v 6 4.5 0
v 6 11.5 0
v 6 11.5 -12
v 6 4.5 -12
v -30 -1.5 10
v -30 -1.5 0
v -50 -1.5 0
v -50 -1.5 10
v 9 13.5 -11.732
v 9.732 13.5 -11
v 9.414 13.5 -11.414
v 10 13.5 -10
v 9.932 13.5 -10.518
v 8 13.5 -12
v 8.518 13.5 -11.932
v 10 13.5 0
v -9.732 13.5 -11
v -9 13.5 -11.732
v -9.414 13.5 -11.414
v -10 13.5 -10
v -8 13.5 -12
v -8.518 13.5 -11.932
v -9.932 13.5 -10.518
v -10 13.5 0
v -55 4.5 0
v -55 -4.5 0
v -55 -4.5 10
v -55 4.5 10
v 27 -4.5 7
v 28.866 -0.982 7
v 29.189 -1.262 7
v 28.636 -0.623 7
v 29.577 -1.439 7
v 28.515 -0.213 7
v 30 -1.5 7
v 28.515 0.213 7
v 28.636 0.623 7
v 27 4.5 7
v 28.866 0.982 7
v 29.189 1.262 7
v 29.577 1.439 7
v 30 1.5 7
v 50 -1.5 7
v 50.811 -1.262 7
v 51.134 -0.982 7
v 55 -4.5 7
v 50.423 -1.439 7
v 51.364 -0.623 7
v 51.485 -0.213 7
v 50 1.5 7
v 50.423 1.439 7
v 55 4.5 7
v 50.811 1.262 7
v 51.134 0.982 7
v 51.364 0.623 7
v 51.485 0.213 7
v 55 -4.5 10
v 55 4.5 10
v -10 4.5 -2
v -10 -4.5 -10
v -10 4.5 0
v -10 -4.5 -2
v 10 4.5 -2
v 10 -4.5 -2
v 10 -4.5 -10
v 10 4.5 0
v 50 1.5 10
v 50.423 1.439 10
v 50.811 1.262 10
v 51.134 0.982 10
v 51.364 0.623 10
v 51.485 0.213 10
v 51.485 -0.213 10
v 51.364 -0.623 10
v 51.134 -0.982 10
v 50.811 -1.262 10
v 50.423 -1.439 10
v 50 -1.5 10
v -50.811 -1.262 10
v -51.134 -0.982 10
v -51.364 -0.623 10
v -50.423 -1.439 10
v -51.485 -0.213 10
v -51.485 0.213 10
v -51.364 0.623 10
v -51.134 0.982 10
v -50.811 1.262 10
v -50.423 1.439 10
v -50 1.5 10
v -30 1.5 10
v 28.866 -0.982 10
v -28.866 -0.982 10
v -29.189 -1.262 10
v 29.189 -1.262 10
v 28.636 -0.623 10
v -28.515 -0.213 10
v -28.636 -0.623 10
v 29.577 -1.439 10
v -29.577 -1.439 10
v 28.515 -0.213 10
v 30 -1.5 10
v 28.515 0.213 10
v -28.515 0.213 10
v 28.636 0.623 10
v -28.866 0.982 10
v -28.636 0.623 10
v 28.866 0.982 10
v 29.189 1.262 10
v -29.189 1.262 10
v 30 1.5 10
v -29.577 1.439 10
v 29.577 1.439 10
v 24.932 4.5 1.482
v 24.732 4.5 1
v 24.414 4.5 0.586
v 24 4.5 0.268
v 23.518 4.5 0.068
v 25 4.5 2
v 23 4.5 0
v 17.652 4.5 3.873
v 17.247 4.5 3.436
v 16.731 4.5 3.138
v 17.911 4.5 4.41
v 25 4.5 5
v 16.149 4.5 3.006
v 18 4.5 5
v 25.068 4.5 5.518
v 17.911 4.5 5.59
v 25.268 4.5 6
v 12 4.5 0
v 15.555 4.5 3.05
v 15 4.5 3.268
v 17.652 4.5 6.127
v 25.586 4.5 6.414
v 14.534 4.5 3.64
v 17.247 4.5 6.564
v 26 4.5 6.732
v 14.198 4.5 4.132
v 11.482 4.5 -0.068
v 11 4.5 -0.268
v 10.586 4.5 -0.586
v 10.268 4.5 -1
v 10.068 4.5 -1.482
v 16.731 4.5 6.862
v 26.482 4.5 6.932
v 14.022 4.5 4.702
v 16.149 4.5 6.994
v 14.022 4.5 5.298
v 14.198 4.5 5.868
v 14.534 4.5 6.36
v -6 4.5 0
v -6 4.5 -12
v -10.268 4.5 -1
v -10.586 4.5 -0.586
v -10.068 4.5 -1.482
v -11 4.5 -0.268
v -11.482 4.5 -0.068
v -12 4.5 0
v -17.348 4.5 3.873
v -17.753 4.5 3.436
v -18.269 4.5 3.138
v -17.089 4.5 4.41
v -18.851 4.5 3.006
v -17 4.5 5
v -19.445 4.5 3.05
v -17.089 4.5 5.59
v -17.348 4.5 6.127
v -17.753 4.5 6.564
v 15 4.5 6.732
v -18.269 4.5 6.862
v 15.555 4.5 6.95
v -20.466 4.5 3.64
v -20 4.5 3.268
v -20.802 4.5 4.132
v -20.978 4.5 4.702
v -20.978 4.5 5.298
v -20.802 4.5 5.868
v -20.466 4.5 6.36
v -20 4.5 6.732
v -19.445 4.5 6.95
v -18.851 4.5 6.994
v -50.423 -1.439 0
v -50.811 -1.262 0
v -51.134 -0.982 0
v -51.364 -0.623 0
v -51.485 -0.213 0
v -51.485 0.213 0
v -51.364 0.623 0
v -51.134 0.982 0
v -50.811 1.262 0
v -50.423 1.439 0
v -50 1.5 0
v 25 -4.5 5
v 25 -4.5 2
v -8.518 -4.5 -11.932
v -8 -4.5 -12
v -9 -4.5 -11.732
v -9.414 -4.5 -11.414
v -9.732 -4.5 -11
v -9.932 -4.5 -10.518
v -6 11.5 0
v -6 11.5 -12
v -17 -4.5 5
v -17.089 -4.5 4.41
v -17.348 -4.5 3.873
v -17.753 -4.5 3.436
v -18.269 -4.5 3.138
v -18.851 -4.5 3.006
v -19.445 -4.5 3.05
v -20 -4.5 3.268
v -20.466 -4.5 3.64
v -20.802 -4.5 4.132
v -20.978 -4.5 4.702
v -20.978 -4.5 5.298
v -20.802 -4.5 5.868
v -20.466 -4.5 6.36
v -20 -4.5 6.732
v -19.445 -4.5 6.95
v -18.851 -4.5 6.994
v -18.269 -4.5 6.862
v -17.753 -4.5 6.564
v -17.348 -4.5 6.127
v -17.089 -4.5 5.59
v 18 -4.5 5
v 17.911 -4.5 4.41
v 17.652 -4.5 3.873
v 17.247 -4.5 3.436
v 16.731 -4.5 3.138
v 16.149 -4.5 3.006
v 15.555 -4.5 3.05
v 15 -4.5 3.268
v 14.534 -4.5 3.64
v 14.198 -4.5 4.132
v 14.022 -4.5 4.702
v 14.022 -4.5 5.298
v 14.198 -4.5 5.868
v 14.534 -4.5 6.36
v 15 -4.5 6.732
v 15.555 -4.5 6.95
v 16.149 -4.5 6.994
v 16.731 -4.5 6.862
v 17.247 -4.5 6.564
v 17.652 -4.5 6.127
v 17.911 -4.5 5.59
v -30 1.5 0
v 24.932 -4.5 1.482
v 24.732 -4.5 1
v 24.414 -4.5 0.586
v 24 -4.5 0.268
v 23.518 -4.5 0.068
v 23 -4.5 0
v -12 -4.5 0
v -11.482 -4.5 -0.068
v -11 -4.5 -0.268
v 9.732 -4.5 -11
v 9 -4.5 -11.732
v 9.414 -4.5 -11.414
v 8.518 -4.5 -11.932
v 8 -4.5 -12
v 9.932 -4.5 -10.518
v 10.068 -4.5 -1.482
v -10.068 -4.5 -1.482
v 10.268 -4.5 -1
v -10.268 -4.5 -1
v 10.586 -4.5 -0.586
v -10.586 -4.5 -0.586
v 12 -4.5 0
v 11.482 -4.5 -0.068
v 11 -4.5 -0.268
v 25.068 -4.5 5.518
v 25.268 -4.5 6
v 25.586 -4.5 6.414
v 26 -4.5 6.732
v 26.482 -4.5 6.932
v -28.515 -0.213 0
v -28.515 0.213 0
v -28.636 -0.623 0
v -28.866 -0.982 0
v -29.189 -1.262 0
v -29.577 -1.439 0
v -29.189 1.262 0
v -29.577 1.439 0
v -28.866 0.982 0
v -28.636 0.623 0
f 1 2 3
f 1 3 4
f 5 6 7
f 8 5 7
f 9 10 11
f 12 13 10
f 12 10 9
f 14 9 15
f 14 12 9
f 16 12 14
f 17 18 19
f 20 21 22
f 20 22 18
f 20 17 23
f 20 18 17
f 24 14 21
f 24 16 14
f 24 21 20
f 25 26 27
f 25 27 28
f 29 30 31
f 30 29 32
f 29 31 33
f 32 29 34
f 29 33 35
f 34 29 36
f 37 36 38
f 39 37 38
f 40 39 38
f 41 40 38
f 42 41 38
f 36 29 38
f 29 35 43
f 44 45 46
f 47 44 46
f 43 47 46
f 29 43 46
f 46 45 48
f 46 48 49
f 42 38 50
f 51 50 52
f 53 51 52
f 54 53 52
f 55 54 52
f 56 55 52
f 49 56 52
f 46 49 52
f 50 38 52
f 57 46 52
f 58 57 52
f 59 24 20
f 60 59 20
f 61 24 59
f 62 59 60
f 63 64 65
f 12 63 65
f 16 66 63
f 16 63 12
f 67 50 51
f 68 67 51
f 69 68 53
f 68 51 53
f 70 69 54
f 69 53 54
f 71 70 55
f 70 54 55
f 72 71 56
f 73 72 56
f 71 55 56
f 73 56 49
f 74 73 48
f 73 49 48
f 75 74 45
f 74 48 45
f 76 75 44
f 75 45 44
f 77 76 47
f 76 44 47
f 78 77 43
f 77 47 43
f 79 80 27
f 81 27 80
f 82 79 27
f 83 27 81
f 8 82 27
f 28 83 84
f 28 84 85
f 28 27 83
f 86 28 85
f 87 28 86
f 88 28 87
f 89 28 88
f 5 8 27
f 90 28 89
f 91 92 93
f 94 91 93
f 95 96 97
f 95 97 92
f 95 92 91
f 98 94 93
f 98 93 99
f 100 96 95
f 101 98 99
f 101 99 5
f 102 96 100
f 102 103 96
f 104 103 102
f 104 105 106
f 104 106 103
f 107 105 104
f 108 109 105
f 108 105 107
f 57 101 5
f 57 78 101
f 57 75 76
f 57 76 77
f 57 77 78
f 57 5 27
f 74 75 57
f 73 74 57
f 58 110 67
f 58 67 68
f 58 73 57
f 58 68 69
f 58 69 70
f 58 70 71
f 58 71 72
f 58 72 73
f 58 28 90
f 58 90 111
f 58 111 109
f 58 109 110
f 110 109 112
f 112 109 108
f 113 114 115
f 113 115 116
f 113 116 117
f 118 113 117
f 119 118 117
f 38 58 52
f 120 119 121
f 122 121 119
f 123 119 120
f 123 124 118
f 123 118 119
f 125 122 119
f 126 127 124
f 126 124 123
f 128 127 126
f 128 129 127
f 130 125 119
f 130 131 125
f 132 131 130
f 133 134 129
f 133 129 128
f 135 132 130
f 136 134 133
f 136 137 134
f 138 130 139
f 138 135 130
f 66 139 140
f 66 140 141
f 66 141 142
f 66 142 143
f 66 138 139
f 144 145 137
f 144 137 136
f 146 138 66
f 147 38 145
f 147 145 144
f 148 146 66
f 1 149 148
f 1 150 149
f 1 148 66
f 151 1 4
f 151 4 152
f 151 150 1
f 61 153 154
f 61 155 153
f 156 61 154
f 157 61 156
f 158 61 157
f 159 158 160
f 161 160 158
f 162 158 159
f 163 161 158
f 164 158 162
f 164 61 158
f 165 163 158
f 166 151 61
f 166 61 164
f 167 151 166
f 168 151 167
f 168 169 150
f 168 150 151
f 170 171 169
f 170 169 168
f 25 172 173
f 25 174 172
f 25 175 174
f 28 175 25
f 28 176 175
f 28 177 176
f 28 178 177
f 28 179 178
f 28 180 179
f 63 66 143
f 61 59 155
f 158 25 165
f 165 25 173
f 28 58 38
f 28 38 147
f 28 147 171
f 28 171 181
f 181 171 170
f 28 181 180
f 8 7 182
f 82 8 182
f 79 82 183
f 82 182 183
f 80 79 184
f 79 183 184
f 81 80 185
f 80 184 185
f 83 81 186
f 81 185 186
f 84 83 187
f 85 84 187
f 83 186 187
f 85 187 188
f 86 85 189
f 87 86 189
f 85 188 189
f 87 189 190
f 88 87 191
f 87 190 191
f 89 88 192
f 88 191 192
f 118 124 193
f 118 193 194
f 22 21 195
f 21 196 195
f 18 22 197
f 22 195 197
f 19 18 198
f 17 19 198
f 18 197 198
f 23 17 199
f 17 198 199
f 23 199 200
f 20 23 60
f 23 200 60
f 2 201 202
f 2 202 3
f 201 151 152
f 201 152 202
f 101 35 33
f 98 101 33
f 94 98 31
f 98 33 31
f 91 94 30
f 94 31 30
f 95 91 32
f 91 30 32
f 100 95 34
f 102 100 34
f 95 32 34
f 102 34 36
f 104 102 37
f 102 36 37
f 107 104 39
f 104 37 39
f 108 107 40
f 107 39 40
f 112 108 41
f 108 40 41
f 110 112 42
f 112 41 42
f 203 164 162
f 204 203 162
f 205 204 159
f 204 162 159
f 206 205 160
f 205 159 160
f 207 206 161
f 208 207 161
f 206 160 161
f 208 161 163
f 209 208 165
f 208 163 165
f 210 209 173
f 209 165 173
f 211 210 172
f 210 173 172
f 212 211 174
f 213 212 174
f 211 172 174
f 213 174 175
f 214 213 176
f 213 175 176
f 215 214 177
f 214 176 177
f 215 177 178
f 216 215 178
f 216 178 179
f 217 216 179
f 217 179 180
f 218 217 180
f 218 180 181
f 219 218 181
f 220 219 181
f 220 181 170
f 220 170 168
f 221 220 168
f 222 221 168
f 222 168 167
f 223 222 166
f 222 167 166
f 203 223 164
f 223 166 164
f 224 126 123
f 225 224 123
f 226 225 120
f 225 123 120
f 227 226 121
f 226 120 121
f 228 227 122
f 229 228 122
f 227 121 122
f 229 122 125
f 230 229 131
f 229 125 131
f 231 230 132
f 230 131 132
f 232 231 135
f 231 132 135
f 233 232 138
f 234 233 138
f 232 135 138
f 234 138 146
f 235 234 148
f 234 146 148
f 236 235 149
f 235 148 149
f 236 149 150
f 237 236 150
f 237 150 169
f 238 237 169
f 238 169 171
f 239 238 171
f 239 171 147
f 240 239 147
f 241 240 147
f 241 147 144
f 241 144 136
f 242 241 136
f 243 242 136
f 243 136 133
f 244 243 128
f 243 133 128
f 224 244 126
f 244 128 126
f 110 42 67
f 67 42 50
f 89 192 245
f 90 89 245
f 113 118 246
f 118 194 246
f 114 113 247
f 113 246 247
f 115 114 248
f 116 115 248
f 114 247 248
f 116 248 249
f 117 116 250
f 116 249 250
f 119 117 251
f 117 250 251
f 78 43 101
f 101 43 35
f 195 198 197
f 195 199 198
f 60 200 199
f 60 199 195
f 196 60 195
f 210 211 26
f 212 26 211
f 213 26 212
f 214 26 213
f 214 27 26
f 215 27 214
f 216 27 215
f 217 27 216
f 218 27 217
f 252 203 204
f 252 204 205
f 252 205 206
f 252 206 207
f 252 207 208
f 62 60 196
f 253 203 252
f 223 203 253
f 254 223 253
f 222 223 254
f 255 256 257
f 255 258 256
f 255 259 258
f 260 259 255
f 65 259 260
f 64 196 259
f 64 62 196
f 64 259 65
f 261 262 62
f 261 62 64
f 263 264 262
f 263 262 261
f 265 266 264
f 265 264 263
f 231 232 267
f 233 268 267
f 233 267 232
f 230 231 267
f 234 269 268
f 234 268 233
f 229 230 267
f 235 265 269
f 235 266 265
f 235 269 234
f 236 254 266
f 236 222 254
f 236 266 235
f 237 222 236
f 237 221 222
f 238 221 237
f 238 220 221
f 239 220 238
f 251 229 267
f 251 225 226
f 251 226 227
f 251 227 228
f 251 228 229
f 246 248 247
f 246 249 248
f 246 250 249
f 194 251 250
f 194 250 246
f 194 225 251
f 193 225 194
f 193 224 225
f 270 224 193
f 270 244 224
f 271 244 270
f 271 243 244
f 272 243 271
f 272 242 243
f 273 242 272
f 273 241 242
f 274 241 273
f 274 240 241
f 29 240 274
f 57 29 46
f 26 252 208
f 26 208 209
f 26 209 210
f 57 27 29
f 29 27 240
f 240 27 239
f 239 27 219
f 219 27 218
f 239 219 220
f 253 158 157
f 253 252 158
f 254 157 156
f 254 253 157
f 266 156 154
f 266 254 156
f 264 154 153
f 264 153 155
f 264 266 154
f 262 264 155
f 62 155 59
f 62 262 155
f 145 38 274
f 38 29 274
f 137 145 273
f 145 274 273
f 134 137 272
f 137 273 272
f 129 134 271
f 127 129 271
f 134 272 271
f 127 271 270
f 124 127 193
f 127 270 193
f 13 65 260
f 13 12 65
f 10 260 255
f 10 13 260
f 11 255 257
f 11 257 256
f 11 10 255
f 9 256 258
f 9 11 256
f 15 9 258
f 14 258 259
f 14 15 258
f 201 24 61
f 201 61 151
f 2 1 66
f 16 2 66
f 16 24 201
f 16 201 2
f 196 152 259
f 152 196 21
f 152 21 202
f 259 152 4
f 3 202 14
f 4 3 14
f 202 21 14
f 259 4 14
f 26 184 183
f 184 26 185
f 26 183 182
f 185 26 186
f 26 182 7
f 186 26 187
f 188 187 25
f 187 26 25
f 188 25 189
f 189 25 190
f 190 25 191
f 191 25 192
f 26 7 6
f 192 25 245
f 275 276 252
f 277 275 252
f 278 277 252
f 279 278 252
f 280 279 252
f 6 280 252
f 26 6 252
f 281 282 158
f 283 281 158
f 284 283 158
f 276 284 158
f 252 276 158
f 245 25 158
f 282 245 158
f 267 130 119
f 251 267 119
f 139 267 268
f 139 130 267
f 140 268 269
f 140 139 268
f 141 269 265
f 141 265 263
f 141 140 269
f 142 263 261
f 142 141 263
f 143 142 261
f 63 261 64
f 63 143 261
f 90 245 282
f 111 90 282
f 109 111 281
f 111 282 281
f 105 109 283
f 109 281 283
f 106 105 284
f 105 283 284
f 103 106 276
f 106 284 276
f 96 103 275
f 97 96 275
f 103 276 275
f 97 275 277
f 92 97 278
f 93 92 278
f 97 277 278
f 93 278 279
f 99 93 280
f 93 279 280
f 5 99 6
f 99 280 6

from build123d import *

# Parameters (mm, degrees)
ESBO_O1_W                = 45
ESBO_O1_H                = 9
RESSALTO_EXTRUS_O2_DEPTH = 10
RESSALTO_EXTRUS_O3_DEPTH = 12
ESBO_O2_R                = 2
ESBO_O2_W                = 30
ESBO_O2_H                = 7
CORTE_EXTRUS_O4_DEPTH    = 9
FILETE2_R                = 2


with BuildPart() as part:
    # Esboço1 → Ressalto-extrusão2 (new body)
    with BuildSketch(Plane.XY):
        with Locations((32.5, 0)):
            Rectangle(ESBO_O1_W, ESBO_O1_H)
        with BuildLine():
            ThreePointArc((30, -1.5), (28.5, 0), (30, 1.5))
            Line((30, 1.5), (50, 1.5))
            ThreePointArc((50, 1.5), (51.5, 0), (50, -1.5))
            Line((50, -1.5), (30, -1.5))
        make_face(mode=Mode.SUBTRACT)
        Polygon((6, 4.5), (-6, 4.5), (-10, 4.5), (-10, -4.5), (10, -4.5), (10, 4.5), align=None)
        with Locations((-32.5, 0)):
            Rectangle(ESBO_O1_W, ESBO_O1_H)
        with BuildLine():
            ThreePointArc((-50, -1.5), (-51.5, 0), (-50, 1.5))
            Line((-50, 1.5), (-30, 1.5))
            ThreePointArc((-30, 1.5), (-28.5, 0), (-30, -1.5))
            Line((-30, -1.5), (-50, -1.5))
        make_face(mode=Mode.SUBTRACT)
    extrude(amount=RESSALTO_EXTRUS_O2_DEPTH)

    # Esboço1<5> → Ressalto-extrusão3 (add)
    with BuildSketch(Plane.XY):
        Polygon((6, 4.5), (-6, 4.5), (-10, 4.5), (-10, -4.5), (10, -4.5), (10, 4.5), align=None)
        Polygon((-10, 4.5), (-6, 4.5), (-6, 11.5), (6, 11.5), (6, 4.5), (10, 4.5), (10, 13.5), (-10, 13.5), align=None)
    extrude(amount=-RESSALTO_EXTRUS_O3_DEPTH)

    # Esboço2 → Corte-extrusão4 (cut)
    with BuildSketch(Plane(origin=(0, 4.5, 0), x_dir=(1, 0, 0), z_dir=(0, 1, 0))):
        with Locations((-19, -5)):
            Circle(ESBO_O2_R)
        with Locations((16, -5)):
            Circle(ESBO_O2_R)
        with Locations((40, -3.5)):
            Rectangle(ESBO_O2_W, ESBO_O2_H)
    extrude(amount=-CORTE_EXTRUS_O4_DEPTH, mode=Mode.SUBTRACT)

    # Filete2
    filete2_edges = [part.edges().sort_by_distance(p)[0] for p in [
        (-10, 0, 0),
        (10, 0, 0),
        (-10, 4.5, -12),
        (10, 4.5, -12),
        (25, 0, 0),
        (25, 0, 7),
    ]]
    fillet(filete2_edges, radius=FILETE2_R)


solid = part.part
